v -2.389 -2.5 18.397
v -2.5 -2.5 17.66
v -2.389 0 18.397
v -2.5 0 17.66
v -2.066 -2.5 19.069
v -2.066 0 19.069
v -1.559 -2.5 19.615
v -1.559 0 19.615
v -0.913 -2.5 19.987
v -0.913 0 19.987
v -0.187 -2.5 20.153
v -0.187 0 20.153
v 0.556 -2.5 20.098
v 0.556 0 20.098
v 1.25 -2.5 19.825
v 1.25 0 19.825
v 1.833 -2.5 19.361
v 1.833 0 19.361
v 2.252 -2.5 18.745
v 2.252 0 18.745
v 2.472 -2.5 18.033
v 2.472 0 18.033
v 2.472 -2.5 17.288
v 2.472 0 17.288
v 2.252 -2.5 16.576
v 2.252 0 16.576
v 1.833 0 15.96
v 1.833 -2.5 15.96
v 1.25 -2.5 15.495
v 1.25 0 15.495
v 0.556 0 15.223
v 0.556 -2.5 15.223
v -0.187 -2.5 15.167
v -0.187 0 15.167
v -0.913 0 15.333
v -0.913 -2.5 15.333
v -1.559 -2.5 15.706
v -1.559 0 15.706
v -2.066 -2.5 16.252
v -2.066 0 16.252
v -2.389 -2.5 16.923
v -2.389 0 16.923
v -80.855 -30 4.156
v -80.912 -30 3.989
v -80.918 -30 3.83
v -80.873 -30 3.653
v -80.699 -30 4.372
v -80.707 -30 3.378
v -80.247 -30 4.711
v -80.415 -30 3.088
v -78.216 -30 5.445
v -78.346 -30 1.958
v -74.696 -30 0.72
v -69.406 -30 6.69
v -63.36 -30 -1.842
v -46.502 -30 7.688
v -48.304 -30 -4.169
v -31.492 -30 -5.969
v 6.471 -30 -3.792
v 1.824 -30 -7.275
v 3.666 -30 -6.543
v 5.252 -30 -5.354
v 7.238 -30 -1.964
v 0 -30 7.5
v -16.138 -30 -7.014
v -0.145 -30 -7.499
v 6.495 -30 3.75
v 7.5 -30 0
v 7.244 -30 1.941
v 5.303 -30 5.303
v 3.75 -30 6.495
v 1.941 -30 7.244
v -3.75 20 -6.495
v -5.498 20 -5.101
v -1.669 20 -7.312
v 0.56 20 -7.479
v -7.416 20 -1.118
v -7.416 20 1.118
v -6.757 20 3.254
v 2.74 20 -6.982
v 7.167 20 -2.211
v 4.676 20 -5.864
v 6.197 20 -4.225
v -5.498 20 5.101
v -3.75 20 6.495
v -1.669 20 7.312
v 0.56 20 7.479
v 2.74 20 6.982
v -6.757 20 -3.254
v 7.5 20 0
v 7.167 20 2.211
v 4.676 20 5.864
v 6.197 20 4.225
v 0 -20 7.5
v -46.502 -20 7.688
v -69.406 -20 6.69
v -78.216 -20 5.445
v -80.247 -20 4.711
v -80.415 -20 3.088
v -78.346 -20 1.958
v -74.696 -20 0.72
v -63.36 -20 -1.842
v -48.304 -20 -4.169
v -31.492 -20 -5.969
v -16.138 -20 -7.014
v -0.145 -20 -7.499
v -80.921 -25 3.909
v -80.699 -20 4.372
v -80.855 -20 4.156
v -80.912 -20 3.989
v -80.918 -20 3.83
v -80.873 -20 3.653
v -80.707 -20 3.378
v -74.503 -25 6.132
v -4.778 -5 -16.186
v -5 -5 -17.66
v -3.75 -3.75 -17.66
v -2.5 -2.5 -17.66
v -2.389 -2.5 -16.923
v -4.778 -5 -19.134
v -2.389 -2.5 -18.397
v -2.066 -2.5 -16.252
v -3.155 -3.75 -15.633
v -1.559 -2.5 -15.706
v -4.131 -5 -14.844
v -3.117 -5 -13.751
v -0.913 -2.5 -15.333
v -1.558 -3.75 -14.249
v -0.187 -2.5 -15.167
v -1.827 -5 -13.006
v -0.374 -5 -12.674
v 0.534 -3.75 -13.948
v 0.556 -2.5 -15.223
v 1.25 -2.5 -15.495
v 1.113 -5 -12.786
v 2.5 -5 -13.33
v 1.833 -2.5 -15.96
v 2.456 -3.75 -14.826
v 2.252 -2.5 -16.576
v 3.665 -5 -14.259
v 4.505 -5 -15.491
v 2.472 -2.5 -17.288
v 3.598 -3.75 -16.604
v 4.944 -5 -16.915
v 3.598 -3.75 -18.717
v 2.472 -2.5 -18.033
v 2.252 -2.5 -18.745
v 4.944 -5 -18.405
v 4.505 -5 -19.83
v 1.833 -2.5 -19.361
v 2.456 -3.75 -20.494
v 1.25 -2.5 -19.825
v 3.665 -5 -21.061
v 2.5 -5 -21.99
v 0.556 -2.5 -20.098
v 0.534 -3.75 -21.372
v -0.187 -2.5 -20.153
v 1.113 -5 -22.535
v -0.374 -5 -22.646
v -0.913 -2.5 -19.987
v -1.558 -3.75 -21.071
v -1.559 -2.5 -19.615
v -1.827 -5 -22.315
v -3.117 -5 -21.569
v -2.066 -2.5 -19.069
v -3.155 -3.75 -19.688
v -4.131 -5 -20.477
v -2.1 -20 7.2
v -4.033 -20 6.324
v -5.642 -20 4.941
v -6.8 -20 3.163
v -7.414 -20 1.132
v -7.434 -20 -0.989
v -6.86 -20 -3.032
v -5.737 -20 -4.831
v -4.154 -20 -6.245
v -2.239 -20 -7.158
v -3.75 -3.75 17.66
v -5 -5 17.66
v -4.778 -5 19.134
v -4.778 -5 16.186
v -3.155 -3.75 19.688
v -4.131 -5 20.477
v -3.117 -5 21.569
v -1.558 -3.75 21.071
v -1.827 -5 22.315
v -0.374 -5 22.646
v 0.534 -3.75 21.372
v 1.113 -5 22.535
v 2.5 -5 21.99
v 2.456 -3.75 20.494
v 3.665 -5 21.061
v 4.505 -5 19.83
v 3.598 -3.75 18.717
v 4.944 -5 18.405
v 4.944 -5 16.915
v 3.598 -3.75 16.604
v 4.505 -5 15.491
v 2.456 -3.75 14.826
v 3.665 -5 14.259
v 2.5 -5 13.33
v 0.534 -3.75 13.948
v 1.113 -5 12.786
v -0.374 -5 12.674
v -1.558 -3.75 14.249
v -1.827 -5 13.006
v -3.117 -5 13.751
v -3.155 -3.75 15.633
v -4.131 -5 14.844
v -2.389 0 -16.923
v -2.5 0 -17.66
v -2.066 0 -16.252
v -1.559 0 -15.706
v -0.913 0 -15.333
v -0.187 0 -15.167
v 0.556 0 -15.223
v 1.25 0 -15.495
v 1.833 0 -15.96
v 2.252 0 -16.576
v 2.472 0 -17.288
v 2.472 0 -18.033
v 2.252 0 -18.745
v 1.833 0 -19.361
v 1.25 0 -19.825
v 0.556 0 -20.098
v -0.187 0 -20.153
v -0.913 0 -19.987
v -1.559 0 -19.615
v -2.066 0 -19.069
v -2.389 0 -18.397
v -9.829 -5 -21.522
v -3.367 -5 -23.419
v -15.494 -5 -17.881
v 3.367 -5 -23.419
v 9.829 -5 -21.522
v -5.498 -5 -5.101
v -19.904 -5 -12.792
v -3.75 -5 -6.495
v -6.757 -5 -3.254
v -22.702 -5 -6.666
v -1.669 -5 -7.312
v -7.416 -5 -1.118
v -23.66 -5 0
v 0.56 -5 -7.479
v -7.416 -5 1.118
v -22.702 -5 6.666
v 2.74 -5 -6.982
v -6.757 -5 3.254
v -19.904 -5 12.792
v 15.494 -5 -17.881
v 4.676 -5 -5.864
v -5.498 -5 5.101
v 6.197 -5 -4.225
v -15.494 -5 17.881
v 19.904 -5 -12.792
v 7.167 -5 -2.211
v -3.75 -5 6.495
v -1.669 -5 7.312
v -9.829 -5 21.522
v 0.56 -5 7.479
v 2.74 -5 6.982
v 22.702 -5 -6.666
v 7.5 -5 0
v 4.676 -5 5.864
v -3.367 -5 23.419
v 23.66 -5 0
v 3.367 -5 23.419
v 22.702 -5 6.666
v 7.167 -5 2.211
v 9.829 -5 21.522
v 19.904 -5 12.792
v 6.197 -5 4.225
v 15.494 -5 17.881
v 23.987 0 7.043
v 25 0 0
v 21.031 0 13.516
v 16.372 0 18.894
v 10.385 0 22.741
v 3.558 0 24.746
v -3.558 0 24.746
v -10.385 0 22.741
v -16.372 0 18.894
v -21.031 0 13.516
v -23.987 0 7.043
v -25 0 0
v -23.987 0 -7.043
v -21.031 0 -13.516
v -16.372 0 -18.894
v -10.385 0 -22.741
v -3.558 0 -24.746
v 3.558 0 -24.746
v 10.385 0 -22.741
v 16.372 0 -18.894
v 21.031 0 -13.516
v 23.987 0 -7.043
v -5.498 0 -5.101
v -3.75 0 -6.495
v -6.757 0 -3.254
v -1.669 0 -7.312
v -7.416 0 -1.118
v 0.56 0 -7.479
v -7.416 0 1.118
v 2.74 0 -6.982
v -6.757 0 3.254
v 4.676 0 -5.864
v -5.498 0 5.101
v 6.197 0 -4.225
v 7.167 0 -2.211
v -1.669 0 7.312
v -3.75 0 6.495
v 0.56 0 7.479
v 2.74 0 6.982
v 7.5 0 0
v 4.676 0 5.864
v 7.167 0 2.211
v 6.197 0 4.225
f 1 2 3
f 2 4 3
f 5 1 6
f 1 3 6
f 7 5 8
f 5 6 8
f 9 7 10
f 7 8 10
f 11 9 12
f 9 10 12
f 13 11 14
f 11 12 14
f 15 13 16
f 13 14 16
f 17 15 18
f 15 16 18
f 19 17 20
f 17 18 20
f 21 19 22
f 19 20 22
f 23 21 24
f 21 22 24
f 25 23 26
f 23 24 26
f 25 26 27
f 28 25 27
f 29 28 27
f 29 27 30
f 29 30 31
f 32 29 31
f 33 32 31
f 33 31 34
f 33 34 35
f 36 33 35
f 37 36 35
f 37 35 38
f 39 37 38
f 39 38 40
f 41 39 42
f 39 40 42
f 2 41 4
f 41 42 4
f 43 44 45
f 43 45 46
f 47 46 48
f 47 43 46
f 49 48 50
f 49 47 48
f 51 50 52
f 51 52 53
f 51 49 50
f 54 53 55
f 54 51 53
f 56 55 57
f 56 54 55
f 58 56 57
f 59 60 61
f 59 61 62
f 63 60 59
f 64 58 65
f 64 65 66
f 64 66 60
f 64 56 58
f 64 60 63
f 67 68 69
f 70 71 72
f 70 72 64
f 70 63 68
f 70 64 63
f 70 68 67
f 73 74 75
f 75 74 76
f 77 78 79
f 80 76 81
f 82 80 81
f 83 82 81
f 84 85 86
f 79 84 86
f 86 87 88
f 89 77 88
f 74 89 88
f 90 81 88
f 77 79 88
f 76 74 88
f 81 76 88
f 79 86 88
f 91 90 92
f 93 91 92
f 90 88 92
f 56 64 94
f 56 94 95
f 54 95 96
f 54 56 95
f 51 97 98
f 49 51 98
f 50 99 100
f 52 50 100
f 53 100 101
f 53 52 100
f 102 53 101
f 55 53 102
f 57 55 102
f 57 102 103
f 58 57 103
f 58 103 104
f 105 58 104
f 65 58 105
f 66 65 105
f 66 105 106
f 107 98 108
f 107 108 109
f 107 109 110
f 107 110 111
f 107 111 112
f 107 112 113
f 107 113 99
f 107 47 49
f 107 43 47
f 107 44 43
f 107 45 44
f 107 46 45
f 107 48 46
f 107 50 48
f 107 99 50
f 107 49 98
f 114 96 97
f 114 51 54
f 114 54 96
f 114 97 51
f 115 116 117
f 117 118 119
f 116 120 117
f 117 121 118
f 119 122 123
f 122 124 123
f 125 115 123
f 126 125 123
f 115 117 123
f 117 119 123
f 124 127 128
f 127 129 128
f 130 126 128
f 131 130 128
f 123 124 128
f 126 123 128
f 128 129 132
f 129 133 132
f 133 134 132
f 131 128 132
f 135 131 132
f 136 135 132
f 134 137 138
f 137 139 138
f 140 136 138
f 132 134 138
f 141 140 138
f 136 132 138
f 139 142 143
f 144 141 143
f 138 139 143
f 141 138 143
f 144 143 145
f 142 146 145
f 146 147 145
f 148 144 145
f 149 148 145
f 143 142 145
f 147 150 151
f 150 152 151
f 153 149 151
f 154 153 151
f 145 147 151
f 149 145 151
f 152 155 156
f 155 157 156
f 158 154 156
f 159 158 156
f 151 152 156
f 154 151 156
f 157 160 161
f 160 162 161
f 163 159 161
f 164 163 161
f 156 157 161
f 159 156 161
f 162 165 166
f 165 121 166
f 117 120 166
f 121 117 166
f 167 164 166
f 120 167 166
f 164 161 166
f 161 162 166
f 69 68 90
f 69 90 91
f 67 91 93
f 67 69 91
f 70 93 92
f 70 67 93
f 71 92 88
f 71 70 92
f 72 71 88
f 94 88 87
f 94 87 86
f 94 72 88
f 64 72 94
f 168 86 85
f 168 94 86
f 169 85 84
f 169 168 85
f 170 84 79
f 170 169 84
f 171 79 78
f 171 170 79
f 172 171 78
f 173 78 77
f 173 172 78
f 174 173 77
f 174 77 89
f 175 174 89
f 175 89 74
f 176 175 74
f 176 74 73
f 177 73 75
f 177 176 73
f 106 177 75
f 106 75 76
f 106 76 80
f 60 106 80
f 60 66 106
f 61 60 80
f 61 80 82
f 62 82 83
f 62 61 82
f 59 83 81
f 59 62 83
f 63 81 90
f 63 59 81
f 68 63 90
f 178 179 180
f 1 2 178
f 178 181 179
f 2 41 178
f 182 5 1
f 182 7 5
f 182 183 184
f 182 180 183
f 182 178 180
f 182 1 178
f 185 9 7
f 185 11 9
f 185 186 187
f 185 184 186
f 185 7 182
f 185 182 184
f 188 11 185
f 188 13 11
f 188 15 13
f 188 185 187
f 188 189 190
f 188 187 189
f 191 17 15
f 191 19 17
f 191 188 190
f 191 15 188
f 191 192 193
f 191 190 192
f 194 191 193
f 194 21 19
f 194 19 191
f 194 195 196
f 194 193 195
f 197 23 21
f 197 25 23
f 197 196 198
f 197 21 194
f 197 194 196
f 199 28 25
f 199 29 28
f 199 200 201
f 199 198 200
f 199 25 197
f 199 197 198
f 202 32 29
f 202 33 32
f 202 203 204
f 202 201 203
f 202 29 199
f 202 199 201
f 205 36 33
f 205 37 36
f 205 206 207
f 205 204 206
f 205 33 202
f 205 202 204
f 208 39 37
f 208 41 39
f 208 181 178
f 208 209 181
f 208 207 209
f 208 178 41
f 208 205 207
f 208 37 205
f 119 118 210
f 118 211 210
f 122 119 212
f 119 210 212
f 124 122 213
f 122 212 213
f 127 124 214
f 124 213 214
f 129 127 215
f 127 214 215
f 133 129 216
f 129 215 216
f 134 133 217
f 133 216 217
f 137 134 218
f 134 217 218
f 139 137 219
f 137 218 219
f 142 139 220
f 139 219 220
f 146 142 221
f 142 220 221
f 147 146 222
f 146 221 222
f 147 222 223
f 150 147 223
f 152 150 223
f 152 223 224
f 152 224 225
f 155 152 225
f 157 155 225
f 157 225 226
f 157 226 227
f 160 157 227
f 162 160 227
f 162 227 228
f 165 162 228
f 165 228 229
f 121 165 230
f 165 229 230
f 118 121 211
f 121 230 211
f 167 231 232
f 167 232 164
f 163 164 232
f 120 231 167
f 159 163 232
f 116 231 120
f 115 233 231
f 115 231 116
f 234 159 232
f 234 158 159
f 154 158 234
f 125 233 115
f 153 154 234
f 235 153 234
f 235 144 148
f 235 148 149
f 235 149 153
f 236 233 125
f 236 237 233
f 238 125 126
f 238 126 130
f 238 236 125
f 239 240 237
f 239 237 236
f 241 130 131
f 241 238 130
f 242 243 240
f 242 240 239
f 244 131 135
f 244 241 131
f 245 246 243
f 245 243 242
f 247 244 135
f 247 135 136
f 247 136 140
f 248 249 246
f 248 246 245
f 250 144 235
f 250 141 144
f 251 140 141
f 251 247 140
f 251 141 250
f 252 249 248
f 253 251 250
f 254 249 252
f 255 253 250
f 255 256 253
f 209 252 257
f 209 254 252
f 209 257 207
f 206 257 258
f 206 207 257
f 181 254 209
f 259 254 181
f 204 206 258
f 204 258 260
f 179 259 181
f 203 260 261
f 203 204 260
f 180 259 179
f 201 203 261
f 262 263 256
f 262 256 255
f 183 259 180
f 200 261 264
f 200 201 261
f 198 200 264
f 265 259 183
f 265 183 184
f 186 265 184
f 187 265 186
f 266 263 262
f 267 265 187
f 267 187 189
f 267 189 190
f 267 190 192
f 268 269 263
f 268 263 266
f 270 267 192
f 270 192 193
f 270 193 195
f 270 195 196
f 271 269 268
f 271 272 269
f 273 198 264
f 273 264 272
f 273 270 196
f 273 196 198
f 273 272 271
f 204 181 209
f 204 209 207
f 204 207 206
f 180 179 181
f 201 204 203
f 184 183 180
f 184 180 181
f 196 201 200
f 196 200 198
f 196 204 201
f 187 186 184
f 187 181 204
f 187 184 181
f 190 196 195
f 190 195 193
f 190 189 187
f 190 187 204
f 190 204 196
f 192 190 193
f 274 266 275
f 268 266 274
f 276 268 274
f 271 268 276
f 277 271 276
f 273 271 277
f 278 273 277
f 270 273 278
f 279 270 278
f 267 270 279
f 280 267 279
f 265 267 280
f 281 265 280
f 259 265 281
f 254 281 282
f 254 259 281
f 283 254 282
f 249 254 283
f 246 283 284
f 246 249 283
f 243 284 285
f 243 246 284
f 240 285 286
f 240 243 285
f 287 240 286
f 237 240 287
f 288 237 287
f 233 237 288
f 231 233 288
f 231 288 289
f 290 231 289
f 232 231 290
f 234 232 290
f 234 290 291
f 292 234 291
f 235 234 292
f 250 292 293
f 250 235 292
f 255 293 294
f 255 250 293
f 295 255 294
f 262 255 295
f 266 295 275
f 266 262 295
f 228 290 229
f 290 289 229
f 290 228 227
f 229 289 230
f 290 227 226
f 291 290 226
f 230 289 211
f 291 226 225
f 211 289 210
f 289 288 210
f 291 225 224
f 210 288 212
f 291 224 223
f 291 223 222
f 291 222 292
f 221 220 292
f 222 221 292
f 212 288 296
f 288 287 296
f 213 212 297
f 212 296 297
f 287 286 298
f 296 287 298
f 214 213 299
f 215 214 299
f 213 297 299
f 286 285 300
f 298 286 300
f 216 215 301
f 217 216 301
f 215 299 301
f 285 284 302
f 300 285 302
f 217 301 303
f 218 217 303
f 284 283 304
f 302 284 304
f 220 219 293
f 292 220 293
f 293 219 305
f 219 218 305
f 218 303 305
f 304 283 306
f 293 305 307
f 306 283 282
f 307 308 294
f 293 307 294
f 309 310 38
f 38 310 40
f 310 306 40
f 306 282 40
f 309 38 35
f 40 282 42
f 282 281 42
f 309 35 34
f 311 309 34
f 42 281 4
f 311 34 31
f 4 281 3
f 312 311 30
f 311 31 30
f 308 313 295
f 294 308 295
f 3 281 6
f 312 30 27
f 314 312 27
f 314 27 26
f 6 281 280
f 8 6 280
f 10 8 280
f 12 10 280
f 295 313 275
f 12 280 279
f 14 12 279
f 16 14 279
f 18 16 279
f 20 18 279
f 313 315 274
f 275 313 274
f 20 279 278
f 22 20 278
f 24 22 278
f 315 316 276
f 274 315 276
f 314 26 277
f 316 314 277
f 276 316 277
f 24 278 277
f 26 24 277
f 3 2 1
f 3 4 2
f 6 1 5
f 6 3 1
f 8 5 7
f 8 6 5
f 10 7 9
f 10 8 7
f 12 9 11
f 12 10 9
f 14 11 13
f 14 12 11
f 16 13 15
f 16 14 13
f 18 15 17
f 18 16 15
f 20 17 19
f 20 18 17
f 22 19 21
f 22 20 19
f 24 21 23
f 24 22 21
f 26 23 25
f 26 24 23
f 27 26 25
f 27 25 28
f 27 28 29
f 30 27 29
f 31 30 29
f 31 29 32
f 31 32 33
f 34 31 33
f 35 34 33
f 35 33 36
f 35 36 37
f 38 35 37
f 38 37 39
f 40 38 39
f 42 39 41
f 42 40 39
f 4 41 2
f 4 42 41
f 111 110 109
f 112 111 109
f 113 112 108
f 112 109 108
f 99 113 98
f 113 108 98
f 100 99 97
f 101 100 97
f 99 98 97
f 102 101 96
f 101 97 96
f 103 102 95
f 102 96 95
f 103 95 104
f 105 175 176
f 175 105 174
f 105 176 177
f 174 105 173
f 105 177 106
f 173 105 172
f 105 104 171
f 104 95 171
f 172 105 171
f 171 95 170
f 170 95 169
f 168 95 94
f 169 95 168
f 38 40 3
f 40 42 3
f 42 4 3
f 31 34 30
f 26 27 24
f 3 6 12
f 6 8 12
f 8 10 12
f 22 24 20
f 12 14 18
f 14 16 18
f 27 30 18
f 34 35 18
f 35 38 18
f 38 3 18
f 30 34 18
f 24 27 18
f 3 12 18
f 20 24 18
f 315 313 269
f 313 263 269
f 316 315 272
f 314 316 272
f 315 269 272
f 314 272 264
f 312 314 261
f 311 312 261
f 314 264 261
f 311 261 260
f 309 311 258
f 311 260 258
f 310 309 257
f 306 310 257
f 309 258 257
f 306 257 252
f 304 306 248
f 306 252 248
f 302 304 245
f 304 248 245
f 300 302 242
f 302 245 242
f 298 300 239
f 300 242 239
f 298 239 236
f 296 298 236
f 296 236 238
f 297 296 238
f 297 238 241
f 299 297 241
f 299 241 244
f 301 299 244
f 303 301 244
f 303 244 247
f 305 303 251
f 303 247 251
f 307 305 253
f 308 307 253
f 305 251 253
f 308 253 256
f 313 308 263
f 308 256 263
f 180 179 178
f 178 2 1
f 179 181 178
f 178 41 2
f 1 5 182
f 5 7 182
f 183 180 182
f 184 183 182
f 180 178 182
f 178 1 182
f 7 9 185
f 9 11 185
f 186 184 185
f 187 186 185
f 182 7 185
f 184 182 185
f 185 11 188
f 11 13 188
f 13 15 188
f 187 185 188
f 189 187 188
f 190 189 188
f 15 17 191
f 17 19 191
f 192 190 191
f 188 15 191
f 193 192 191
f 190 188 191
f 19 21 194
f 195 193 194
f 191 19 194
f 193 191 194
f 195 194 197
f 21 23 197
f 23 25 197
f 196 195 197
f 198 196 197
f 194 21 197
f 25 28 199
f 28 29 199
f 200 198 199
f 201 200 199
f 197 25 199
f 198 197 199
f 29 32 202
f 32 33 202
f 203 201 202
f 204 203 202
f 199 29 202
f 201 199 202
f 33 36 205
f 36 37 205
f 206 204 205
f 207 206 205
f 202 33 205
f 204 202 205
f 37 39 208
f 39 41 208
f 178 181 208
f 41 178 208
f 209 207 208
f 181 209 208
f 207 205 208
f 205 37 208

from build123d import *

# Parameters (mm, degrees)
F0_R           = 25
F1_DEPTH       = 5
F1_TAPER       = 15
F3_D           = 5
F3_DEPTH       = 12
F3_CSINK_D     = 10
F3_CSINK_ANGLE = 90
F3_TIP         = 1.5021515476
F4_R           = 7.5
F5_DEPTH       = 25
F8_DEPTH       = 10
F9_R           = 5
F10_DEPTH      = 5


with BuildPart() as f1:
    # F0 (on Front) → F1 (new body)
    with BuildSketch(Plane.XZ):
        Circle(F0_R)
    extrude(amount=F1_DEPTH, taper=F1_TAPER)

    # F3
    with Locations(Plane.XZ.offset(5)):
        with Locations((0, 17.6602540378), (0, -17.6602540378)):
            CounterSinkHole(F3_D / 2, F3_CSINK_D / 2, depth=F3_DEPTH, counter_sink_angle=F3_CSINK_ANGLE)
            with Locations((0, 0, -(F3_DEPTH + F3_TIP / 2))):  # 118° drill point
                Cone(0, F3_D / 2, F3_TIP, mode=Mode.SUBTRACT)


with BuildPart() as f5:
    # F4 (on face) → F5 (new body, symmetric)
    with BuildSketch(Plane.XZ.offset(5)):
        Circle(F4_R)
    extrude(amount=F5_DEPTH, both=True)


with BuildPart() as f1_1:
    add(f1.part)

    # F6: cut F5
    add(f5.part, mode=Mode.SUBTRACT)


with BuildPart() as f5_1:
    add(f5.part)

    # F7 (on face) → F8 (join)
    with BuildSketch(Plane.XZ.offset(30)):
        with BuildLine():
            ThreePointArc((-0.1448555928, -7.4986009933), (-7.4996502402, 0.0724311742), (0, 7.5))
            add(Edge.make_bspline(
                [(0, 7.5), (-40.8477857709, 8.3165615797), (-120.8472087584, 7.1810955966), (-41.1422293927, -7.0946895923), (-0.1448555928, -7.4986009933)],
                knots=[0, 0, 0, 0, 0.4988928977, 0.9994105268, 0.9994105268, 0.9994105268, 0.9994105268], degree=3))
        make_face()
    extrude(amount=-F8_DEPTH)


with BuildPart() as f10:
    # F9 (on face) → F10 (new body, through all)
    with BuildSketch(Plane.XZ.offset(5)):
        with Locations((0, 17.6602540378)):
            Circle(F9_R)
    extrude(amount=-F10_DEPTH)

    # F11: cut F1
    add(f1_1.part, mode=Mode.SUBTRACT)


solid = Compound([f1_1.part, f5_1.part, f10.part])
